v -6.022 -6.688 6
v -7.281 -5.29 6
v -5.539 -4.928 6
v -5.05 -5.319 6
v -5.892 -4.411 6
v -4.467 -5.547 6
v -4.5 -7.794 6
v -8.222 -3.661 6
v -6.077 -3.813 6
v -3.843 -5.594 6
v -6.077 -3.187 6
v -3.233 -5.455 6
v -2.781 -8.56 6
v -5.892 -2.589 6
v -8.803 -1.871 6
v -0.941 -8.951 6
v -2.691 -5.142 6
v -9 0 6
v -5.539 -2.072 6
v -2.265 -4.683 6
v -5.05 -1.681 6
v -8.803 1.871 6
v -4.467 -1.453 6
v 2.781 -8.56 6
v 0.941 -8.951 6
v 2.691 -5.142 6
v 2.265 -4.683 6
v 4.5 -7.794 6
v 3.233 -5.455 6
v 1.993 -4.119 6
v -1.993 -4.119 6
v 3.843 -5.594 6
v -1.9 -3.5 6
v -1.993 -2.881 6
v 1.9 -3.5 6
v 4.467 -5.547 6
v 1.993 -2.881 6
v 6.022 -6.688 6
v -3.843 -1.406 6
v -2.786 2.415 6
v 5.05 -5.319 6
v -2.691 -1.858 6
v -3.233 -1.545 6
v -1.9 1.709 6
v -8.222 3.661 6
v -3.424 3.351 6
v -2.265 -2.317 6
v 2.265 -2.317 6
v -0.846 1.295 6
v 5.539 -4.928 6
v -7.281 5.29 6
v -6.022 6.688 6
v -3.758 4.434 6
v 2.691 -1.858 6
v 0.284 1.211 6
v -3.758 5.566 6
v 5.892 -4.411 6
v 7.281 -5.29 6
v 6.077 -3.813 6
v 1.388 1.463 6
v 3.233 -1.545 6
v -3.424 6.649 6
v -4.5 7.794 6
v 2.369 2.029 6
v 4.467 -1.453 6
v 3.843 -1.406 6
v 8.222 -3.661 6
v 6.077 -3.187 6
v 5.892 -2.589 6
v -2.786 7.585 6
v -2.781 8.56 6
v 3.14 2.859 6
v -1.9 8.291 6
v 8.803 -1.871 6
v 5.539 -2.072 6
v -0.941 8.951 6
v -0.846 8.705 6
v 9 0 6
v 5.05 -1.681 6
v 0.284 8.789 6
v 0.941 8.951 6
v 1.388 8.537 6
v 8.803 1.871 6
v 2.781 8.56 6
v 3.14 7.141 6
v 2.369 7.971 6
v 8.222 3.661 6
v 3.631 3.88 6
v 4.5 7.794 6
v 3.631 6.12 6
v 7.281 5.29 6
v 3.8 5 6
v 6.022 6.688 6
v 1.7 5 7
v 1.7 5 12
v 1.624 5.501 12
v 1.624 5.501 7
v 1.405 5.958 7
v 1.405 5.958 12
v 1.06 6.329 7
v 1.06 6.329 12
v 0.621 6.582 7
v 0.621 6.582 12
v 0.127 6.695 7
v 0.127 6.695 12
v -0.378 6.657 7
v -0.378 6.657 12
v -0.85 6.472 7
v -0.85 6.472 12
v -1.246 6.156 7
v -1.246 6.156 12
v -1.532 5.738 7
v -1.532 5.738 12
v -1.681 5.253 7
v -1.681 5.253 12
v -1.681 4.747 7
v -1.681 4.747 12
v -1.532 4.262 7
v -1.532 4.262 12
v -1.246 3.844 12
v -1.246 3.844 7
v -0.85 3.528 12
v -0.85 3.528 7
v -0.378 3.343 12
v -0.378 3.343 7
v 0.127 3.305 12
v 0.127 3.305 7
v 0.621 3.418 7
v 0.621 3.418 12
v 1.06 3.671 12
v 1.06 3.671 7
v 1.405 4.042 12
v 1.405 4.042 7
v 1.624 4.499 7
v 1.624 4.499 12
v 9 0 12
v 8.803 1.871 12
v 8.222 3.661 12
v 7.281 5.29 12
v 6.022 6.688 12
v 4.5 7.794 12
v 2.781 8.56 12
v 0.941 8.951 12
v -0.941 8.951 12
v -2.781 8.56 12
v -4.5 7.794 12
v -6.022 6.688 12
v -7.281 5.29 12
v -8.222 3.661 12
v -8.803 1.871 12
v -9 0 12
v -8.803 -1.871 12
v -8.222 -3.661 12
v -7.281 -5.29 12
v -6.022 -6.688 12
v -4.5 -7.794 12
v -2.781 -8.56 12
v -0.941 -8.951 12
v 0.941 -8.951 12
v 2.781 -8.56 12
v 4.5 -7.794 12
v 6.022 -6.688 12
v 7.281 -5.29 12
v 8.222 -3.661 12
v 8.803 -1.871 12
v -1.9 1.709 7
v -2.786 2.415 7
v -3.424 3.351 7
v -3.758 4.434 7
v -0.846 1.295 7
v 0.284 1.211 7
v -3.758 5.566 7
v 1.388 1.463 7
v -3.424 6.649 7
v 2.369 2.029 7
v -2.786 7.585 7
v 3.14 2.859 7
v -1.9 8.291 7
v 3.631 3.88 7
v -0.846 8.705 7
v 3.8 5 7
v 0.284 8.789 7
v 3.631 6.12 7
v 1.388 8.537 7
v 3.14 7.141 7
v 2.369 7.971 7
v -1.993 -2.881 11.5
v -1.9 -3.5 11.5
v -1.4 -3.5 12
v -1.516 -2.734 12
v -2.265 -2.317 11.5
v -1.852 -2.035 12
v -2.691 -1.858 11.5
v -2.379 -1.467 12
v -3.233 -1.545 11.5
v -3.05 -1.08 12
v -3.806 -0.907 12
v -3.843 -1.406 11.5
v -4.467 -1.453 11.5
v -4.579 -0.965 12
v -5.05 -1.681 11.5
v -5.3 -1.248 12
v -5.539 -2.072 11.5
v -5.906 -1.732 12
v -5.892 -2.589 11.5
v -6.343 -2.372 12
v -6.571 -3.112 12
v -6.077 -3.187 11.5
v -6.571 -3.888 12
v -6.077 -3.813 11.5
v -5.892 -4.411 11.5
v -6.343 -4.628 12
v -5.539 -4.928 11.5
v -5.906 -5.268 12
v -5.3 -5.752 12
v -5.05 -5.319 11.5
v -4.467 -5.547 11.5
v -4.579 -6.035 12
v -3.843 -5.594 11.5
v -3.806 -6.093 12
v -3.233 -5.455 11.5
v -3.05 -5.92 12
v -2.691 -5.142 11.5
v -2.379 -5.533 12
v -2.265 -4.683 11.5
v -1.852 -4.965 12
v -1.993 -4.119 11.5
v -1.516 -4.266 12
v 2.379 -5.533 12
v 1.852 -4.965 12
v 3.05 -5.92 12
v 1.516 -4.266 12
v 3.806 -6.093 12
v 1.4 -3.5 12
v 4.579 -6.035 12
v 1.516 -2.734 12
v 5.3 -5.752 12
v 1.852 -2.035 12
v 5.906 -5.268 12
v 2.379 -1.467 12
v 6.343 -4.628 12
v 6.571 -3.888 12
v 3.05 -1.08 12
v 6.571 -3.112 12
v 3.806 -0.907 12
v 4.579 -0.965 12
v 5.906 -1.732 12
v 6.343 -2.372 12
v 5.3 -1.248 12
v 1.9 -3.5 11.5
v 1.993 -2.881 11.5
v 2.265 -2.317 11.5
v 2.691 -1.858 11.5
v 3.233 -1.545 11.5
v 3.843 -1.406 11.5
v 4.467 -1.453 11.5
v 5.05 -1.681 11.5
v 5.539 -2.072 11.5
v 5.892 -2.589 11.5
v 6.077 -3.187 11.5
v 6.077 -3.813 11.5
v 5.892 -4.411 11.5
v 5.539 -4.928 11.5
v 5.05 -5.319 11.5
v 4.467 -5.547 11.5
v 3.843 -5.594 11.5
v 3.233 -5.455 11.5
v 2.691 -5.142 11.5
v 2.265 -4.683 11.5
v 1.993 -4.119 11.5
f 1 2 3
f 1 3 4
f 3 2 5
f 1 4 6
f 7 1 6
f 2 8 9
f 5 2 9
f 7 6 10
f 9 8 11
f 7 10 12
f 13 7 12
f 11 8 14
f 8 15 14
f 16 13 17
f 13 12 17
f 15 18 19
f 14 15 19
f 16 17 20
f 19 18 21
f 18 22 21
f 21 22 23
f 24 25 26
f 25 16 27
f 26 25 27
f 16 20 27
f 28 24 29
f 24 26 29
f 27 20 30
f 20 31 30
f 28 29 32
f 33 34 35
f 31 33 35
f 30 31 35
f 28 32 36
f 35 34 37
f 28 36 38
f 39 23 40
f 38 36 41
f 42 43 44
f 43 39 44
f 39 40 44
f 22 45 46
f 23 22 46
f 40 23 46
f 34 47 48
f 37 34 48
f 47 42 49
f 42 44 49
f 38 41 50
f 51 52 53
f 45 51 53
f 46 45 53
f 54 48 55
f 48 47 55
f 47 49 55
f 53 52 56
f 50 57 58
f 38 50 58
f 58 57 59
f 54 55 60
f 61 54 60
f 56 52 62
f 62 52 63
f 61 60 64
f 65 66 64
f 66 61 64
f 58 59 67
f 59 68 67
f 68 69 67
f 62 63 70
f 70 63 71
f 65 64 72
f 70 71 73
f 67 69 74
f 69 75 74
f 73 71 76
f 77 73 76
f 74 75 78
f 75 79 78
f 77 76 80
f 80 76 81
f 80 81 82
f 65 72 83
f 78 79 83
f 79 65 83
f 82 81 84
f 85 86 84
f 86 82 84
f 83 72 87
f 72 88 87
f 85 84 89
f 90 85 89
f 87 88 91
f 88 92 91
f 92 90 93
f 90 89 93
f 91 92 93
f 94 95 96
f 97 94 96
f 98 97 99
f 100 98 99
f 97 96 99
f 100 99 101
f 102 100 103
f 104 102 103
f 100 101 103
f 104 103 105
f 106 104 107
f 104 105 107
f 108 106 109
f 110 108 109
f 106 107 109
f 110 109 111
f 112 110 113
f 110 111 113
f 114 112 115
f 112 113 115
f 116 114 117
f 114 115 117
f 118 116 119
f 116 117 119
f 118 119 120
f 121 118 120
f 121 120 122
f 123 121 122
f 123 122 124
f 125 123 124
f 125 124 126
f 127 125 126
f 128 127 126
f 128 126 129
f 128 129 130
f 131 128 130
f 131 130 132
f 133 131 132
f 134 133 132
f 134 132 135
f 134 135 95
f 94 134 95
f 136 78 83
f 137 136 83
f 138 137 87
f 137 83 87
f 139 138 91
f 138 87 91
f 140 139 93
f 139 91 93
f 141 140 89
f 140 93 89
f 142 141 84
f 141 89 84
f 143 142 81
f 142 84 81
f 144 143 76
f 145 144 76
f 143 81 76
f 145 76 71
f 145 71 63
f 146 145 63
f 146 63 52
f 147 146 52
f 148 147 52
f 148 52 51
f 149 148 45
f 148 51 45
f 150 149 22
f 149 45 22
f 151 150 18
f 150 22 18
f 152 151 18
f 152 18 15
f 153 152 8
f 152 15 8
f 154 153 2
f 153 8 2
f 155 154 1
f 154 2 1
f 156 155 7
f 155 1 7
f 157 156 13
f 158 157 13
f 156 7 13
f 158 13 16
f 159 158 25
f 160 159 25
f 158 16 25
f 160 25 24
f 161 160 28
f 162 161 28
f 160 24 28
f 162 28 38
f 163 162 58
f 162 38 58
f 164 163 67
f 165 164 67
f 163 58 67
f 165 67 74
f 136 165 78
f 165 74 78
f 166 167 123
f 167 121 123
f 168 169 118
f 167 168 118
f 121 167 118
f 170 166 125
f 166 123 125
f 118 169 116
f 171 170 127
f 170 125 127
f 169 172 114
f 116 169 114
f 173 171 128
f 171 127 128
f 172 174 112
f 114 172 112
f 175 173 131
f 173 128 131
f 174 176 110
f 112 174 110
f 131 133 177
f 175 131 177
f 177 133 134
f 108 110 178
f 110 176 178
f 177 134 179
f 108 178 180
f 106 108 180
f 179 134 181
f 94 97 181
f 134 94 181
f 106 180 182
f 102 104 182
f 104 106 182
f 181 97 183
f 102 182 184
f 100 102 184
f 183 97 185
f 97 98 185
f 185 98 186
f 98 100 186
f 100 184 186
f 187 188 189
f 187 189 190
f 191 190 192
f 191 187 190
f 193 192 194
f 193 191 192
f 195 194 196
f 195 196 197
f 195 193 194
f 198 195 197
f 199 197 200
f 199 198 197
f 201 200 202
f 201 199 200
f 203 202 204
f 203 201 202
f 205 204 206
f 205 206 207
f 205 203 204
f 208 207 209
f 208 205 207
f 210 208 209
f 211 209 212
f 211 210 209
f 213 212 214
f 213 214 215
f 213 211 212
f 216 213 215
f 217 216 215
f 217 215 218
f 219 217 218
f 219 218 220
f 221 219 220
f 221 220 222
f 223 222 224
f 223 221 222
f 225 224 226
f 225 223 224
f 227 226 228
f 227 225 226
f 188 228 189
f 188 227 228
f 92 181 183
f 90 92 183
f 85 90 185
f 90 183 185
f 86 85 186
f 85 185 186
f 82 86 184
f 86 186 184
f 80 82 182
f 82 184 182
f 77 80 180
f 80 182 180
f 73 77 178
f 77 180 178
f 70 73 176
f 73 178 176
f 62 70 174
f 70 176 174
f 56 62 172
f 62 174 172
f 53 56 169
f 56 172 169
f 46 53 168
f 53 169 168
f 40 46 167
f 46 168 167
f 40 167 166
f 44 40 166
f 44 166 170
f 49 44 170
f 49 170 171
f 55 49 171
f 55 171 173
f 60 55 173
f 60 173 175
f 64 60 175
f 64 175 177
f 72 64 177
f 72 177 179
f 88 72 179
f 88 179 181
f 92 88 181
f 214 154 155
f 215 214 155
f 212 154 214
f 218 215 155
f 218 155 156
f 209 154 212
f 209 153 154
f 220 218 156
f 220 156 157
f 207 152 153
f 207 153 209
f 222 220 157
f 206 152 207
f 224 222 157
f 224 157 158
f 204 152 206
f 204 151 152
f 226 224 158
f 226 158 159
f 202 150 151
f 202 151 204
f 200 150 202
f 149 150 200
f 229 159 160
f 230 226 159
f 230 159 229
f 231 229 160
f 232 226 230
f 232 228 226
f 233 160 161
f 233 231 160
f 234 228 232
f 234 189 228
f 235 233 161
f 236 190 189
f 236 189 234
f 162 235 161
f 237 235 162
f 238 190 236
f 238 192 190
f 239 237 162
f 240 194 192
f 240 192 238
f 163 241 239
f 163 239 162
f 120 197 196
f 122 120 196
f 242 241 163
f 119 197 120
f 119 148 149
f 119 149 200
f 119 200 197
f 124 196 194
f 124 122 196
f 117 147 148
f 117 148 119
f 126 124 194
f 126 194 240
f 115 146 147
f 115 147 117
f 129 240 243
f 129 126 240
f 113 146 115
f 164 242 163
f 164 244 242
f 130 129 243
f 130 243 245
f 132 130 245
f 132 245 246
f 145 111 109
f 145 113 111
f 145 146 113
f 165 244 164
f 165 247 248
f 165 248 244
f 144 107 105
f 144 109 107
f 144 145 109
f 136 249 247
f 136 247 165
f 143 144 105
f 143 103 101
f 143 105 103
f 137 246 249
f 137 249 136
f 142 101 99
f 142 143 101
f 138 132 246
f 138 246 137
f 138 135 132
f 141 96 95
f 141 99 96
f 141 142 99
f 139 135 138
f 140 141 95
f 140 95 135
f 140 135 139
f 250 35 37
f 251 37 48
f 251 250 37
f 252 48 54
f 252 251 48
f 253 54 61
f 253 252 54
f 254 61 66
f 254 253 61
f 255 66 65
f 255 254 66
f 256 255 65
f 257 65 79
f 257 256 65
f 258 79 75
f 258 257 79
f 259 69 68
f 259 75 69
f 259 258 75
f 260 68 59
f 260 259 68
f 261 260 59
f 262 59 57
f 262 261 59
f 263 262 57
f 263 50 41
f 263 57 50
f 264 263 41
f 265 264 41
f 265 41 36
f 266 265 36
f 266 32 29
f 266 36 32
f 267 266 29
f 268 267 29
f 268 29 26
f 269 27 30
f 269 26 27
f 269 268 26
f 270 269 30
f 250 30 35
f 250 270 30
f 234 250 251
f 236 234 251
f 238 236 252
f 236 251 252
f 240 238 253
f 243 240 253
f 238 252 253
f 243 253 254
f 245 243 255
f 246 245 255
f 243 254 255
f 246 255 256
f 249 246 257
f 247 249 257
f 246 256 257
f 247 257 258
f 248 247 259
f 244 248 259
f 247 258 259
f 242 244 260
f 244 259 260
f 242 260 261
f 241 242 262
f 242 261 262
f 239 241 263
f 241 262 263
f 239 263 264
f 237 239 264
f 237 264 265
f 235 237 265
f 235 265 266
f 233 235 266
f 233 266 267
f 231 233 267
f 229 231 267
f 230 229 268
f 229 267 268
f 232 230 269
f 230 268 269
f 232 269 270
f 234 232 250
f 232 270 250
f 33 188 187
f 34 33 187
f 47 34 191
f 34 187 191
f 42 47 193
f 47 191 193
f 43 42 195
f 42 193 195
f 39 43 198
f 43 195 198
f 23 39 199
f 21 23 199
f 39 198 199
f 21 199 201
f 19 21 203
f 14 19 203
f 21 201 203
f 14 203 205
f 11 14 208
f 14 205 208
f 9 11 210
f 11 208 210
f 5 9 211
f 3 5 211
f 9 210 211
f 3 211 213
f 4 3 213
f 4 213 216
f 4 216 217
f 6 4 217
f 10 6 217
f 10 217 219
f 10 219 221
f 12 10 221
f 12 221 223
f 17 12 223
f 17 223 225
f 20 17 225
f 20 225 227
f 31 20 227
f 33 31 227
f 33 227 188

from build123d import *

# Parameters (mm, degrees)
PAD001_START    = 6
SKETCH007_R     = 9
PAD001_DEPTH    = 6
SKETCH008_R     = 1.7
HOLE001_DEPTH   = 6.001
POCKET006_START = -5
SKETCH009_R     = 3.8
POCKET006_DEPTH = 95
SKETCH010_R     = 2.1
POCKET007_DEPTH = 58.307787
CHAMFER_SIZE    = 0.5


with BuildPart() as part:
    # Sketch007 → Pad001 (new body)
    with BuildSketch(Plane.XY.offset(PAD001_START)):
        Circle(SKETCH007_R)
    extrude(amount=PAD001_DEPTH)

    # Sketch008 (on Face3 of Pad001) → Hole001 (cut, through all)
    with BuildSketch(Plane.XY.offset(12)):
        with Locations((0, 5)):
            Circle(SKETCH008_R)
    extrude(amount=-HOLE001_DEPTH, mode=Mode.SUBTRACT)

    # Sketch009 (on Face3 of Hole001) → Pocket006 (cut)
    with BuildSketch(Plane.XY.offset(12).offset(POCKET006_START)):
        with Locations((0, 5)):
            Circle(SKETCH009_R)
    extrude(amount=-POCKET006_DEPTH, mode=Mode.SUBTRACT)

    # Sketch010 (on Face3 of Pocket006) → Pocket007 (cut, through all)
    with BuildSketch(Plane.XY.offset(12)):
        with Locations((-4, -3.5)):
            Circle(SKETCH010_R)
    pocket007 = extrude(amount=-POCKET007_DEPTH, mode=Mode.SUBTRACT)

    # Mirrored001: Pocket007 across YZ
    add(pocket007.mirror(Plane.YZ), mode=Mode.SUBTRACT)

    # Chamfer
    chamfer_edges = [part.edges().sort_by_distance(p)[0] for p in [
        (6.1, -3.5, 12),
        (-6.1, -3.5, 12),
    ]]
    chamfer(chamfer_edges, length=CHAMFER_SIZE)


solid = part.part
